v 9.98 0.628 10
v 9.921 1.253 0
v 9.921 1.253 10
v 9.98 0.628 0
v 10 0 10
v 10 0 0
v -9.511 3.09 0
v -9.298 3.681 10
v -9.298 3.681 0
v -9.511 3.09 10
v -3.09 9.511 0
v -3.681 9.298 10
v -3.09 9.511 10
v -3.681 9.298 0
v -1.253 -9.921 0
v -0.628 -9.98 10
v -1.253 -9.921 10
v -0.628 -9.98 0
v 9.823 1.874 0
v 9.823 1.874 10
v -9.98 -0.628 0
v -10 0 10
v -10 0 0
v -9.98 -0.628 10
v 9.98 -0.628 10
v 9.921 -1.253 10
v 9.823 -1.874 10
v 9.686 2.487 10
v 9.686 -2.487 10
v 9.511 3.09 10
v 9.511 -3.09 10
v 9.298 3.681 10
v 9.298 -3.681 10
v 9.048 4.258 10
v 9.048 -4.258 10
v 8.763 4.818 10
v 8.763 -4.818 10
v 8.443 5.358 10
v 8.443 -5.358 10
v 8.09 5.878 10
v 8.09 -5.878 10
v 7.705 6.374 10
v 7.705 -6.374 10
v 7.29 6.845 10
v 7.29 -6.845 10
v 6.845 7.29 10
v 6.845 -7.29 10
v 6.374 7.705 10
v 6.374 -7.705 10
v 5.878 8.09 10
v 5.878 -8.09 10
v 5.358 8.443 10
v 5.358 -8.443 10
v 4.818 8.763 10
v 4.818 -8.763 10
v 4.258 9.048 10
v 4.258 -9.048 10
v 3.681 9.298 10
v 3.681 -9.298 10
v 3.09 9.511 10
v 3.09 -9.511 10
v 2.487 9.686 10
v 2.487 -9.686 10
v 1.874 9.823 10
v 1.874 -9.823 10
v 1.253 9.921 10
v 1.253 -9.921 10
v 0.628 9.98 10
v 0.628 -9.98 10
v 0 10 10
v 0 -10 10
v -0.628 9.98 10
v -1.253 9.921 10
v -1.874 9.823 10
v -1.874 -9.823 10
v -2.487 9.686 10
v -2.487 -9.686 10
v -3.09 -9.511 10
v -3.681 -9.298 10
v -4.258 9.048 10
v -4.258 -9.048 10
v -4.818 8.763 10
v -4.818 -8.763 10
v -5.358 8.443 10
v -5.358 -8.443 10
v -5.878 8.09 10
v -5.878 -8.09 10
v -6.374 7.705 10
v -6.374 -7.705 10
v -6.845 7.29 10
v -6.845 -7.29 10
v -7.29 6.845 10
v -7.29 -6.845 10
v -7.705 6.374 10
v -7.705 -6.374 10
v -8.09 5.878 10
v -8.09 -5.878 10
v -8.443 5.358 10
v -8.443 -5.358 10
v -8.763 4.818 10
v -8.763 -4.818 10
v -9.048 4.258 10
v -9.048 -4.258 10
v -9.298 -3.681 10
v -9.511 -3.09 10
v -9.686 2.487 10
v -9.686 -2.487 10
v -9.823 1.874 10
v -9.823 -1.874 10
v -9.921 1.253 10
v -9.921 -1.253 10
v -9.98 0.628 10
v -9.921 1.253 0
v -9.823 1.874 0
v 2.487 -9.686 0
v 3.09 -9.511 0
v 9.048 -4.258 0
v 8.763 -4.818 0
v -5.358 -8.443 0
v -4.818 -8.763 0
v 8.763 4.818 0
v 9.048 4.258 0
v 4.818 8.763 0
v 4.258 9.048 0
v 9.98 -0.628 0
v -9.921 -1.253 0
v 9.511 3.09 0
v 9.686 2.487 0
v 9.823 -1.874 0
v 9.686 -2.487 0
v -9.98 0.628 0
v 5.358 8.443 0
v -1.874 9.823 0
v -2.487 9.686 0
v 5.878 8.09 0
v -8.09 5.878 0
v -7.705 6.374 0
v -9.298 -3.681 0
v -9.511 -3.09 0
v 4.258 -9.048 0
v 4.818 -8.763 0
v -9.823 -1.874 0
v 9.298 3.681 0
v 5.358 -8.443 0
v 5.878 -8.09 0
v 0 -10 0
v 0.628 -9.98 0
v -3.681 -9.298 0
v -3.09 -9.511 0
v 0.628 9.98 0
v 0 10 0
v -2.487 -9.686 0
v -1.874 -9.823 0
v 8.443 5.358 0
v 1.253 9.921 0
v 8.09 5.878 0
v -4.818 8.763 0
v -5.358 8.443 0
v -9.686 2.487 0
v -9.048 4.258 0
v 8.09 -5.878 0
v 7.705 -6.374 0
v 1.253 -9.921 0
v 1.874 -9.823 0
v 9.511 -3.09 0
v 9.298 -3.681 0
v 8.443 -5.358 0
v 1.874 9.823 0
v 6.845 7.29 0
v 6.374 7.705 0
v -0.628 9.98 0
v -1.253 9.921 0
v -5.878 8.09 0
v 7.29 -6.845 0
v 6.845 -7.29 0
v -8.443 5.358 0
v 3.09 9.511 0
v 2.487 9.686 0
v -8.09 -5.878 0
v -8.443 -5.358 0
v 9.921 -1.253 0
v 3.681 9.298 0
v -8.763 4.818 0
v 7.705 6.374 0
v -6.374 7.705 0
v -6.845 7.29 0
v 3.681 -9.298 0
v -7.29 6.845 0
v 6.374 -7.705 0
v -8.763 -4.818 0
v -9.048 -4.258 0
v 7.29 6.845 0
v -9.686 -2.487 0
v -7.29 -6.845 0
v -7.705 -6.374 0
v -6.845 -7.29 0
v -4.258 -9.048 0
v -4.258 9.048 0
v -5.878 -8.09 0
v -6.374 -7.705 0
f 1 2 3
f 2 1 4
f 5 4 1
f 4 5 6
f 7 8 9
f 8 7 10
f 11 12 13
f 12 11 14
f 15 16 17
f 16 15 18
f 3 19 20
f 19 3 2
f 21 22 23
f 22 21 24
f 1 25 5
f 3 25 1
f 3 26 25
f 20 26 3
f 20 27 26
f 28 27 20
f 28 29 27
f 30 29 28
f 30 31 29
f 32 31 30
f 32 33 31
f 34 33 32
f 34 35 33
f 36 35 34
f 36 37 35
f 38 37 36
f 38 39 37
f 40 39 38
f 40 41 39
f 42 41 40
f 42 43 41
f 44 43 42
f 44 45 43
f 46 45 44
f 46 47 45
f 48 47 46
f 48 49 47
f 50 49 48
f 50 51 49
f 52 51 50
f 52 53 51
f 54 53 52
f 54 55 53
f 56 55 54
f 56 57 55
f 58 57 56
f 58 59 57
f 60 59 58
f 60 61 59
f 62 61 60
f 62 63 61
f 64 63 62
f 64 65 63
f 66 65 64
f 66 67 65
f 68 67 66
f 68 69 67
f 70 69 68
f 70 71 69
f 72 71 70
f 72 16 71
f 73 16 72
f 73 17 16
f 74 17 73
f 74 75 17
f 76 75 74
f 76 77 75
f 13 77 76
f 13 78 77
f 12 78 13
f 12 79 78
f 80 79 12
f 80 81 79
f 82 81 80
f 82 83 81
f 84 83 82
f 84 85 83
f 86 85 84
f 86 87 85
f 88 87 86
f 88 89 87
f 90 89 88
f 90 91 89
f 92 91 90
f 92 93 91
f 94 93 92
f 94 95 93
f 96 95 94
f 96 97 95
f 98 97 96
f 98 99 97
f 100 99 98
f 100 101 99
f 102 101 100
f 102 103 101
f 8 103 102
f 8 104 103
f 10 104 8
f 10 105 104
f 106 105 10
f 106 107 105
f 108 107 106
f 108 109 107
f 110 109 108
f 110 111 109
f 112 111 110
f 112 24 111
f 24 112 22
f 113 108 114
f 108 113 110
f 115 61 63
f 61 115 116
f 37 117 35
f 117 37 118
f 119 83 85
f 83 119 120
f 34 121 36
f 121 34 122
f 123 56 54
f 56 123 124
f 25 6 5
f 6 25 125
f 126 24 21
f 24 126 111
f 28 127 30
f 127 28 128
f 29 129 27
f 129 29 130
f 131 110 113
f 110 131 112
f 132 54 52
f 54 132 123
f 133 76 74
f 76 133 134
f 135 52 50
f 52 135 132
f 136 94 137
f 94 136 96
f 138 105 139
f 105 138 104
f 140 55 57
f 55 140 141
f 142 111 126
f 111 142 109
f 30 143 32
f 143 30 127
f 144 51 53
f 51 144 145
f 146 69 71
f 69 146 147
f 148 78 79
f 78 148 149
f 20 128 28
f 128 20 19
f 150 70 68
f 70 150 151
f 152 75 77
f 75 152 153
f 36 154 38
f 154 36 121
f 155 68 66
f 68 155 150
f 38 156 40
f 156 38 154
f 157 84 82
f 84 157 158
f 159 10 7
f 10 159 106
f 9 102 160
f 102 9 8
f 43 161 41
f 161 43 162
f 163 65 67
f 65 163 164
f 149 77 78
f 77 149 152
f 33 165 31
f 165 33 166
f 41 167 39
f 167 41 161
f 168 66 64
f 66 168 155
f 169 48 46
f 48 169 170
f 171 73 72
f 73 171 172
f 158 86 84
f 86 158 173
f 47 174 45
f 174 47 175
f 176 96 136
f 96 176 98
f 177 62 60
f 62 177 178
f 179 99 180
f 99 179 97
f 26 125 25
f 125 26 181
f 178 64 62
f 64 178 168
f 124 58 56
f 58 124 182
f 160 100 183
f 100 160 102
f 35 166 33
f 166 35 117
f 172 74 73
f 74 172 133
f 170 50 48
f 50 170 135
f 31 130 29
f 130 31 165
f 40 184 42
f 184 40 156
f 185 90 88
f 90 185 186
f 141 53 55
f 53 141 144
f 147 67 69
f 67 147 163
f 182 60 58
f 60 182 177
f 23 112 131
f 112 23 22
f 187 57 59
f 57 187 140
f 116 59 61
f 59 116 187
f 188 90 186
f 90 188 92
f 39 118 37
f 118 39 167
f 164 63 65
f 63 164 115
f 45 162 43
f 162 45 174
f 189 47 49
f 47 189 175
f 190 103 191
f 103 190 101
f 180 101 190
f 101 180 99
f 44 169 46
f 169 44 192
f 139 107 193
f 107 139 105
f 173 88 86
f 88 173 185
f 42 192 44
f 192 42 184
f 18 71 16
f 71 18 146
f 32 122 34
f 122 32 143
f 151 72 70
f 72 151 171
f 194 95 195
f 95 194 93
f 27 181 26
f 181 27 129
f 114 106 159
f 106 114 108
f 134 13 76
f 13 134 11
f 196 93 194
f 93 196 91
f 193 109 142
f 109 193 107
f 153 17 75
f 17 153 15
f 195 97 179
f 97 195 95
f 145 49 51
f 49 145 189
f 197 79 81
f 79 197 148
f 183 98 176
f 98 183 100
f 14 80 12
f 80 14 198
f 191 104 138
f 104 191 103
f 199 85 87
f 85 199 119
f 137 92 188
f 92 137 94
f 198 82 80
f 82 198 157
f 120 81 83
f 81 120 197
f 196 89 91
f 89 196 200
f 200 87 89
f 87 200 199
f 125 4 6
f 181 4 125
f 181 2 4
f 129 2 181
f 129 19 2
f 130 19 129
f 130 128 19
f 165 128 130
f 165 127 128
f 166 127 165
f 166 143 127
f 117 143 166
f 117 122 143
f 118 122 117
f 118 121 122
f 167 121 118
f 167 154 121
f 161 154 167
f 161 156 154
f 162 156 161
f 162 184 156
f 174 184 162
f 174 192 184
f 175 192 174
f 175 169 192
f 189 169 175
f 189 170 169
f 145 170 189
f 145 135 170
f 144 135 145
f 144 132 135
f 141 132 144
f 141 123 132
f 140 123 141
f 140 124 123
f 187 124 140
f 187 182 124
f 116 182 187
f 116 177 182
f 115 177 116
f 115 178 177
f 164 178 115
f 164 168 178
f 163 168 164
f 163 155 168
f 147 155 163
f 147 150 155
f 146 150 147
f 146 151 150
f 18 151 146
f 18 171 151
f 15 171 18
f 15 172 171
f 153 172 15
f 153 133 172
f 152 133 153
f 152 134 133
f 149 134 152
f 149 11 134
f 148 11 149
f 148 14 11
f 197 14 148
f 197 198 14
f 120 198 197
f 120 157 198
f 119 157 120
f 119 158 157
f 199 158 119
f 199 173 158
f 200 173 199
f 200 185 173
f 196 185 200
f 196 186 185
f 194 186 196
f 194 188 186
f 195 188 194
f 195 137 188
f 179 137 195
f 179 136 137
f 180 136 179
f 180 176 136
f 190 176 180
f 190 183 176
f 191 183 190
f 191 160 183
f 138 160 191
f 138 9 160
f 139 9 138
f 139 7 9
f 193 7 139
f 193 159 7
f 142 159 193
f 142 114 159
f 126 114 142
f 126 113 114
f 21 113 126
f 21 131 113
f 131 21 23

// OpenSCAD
$fn = 100;

// Defining the base
cylinder(h = 10, r = 10);

// Defining the crystal
translate([ 0, 0, 10 ]) polyhedron(
    // Vertices
    points =
        [
            [ 0, 0, 0 ],                                            // Bottom
            [ -7, -4, 12 ],                                         // The rest are the top points
            [ 6, -5, 8 ], [ 4, 5, 15 ], [ -4, 7, 10 ], [ 0, 0, 20 ] // Top point
        ],
    // Faces
    faces = [ [ 0, 1, 2 ], [ 0, 2, 3 ], [ 0, 3, 4 ], [ 0, 4, 1 ], [ 1, 2, 5 ], [ 2, 3, 5 ], [ 3, 4, 5 ], [ 4, 1, 5 ] ]);
